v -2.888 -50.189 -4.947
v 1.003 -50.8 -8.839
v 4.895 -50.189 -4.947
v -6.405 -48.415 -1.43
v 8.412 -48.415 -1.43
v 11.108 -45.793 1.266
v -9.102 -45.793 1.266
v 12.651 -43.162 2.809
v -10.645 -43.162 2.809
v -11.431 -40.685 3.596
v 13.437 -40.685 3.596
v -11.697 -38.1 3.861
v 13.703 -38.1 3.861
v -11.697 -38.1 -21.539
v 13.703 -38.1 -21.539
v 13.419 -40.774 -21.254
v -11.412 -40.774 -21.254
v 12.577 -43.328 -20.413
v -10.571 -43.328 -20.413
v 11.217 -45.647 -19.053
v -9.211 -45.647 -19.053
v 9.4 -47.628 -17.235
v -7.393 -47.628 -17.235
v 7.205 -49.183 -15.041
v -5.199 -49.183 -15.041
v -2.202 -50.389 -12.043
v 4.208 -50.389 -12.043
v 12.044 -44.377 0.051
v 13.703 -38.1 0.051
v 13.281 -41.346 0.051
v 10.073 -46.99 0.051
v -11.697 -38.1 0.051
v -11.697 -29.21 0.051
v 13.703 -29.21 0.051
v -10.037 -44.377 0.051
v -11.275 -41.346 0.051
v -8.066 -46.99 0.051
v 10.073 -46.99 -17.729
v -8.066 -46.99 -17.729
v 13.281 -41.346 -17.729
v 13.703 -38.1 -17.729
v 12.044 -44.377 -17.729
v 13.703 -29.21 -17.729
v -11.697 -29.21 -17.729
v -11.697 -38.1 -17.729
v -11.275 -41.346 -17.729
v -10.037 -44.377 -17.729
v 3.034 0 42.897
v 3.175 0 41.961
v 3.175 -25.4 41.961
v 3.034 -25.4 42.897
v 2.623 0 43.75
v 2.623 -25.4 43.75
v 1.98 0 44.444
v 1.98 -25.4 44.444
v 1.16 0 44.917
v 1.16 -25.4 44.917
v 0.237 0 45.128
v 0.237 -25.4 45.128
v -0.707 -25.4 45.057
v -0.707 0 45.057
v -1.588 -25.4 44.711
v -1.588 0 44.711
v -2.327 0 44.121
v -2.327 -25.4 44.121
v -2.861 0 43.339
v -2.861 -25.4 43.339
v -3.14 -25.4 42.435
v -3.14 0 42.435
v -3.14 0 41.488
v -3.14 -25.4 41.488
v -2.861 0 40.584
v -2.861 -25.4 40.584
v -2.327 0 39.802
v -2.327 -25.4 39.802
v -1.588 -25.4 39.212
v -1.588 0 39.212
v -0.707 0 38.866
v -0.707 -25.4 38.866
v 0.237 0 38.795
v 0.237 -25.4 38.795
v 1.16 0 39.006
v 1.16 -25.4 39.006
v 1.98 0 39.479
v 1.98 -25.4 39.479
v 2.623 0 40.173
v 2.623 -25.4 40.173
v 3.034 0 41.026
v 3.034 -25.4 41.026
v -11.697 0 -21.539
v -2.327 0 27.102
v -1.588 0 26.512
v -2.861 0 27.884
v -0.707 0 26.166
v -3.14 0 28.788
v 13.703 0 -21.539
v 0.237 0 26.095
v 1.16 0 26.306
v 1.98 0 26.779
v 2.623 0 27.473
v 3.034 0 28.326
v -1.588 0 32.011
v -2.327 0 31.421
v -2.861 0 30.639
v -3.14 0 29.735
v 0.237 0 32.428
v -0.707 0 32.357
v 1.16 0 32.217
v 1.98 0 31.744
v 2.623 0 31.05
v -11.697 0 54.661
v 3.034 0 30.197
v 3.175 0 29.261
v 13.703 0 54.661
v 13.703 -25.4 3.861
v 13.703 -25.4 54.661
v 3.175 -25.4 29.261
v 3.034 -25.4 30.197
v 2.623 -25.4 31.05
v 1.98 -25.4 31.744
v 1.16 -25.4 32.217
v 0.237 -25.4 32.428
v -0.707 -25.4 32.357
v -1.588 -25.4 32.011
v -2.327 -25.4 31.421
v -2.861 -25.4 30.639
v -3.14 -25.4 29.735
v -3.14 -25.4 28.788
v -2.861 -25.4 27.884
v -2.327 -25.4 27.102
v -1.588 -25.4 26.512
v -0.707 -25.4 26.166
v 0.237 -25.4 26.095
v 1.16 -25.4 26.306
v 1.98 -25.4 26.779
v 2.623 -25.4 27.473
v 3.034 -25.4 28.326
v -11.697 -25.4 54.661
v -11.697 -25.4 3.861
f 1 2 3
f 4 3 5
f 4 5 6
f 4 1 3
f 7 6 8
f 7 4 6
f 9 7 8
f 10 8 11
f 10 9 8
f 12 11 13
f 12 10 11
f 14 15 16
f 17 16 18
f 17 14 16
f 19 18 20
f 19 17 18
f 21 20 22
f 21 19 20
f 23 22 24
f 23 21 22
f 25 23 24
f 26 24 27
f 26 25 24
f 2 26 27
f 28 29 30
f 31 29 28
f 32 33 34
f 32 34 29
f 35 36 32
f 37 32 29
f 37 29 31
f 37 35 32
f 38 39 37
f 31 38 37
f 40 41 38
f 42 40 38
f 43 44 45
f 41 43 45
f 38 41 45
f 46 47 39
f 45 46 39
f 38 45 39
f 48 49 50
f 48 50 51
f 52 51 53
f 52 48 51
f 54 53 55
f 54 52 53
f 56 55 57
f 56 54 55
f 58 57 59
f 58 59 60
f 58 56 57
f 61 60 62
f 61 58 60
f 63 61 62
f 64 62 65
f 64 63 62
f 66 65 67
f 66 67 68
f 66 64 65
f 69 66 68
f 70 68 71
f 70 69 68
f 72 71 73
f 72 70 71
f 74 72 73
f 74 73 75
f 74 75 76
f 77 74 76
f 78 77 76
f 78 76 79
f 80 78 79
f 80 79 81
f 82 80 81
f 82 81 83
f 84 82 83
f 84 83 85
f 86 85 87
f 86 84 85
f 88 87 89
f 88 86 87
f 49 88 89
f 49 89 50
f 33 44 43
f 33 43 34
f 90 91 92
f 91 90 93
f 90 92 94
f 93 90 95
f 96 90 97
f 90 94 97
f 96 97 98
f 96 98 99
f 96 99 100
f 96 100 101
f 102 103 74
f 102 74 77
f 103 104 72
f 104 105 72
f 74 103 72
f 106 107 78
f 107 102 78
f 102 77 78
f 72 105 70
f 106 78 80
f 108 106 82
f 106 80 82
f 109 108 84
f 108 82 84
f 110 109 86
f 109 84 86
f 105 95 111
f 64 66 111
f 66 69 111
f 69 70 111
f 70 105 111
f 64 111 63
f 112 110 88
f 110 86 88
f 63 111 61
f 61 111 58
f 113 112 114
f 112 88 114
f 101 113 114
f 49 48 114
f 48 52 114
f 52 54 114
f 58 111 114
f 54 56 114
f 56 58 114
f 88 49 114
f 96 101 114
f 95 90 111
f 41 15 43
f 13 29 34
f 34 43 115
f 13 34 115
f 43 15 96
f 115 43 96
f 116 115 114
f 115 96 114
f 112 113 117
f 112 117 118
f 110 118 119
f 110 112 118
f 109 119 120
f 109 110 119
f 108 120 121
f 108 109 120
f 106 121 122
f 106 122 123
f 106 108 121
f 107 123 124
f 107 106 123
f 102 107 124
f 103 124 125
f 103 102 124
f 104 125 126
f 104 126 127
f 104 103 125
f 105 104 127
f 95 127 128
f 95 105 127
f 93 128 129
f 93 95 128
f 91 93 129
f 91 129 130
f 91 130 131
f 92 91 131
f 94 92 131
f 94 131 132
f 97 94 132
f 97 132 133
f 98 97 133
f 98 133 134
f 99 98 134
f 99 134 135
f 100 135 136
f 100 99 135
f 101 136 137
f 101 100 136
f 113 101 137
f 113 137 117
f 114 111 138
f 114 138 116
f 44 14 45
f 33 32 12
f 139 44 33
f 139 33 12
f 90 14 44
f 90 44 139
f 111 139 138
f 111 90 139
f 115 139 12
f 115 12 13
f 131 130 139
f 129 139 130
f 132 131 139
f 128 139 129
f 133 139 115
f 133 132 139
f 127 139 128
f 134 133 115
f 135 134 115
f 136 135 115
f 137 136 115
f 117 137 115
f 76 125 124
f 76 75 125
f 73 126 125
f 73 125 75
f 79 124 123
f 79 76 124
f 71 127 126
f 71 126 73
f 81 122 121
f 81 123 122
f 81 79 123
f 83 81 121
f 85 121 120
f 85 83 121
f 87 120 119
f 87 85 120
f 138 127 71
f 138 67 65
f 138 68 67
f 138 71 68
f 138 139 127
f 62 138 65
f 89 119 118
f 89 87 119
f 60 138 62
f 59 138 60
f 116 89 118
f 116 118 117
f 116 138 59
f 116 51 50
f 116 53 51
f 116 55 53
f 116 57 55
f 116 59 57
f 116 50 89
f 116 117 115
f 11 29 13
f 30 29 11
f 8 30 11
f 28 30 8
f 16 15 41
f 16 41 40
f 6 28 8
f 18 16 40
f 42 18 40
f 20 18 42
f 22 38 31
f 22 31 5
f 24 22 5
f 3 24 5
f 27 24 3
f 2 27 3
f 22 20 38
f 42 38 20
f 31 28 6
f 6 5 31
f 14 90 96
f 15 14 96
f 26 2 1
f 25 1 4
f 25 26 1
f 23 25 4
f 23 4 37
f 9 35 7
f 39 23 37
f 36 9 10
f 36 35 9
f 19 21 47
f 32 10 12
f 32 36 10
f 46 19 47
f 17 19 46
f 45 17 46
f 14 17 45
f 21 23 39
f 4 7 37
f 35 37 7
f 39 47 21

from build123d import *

# Parameters (mm, degrees)
F0_W        = 25.4
F0_H        = 76.2
F0_R        = 3.175
F1_DEPTH    = 25.4
F2_W        = 25.4
F2_H        = 25.4
F3_DEPTH    = 25.4
F4_W        = 17.78
F4_H        = 17.78
F5_DEPTH    = 63.5
F6_T1_DEPTH = 88.9
F6_T3_DEPTH = 88.9


# Not quite as in the source:
# - a fillet or chamfer that OpenCascade refuses, or shapes differently, is made with other operations: its cross-section is extruded or revolved along the edge and cut away or added


with BuildPart() as f1:
    # F0 (on Front) → F1 (new body)
    with BuildSketch(Plane.XZ):
        with Locations((1.0031497249, 16.5614479933)):
            Rectangle(F0_W, F0_H)
        with Locations((0, 29.2614479933)):
            Circle(F0_R, mode=Mode.SUBTRACT)
        with Locations((0, 41.9614479933)):
            Circle(F0_R, mode=Mode.SUBTRACT)
    extrude(amount=F1_DEPTH)

    # F2 (on face) → F3 (join)
    with BuildSketch(Plane.XZ.offset(25.4)):
        with Locations((1.0031497249, -8.8385520067)):
            Rectangle(F2_W, F2_H)
    extrude(amount=F3_DEPTH)

    # F4 (on face) → F5 (cut, symmetric)
    with BuildSketch(Plane(origin=(-11.6968502751, 0, 0), x_dir=(0, -1, 0), z_dir=(-1, 0, 0))):
        with Locations((38.1, -8.8385520067)):
            Rectangle(F4_W, F4_H)
    extrude(amount=F5_DEPTH, both=True, mode=Mode.SUBTRACT)

    # F6: fillet of radius 12.7 on 4 edges, made by hand

    # F6_s2 → F6_t1 (cut)
    with BuildSketch(Plane.YZ.offset(-43.4468502751)):
        with BuildLine():
            ThreePointArc((-50.8, -8.8385520067), (-47.0802561211, 0.1417041144), (-38.1, 3.8614479933))
            Line((-38.1, 3.8614479933), (-50.8, 3.8614479933))
            Line((-50.8, 3.8614479933), (-50.8, -8.8385520067))
        make_face()
        with BuildLine():
            ThreePointArc((-38.1, -21.5385520067), (-47.0802561211, -17.8188081278), (-50.8, -8.8385520067))
            Line((-50.8, -8.8385520067), (-50.8, -21.5385520067))
            Line((-50.8, -21.5385520067), (-38.1, -21.5385520067))
        make_face()
    extrude(amount=F6_T1_DEPTH, mode=Mode.SUBTRACT)

    # F6_s4 → F6_t3 (cut)
    with BuildSketch(Plane.XY.offset(-53.2885520067)):
        with BuildLine():
            ThreePointArc((1.0031497249, -50.8), (-7.9771063962, -47.0802561211), (-11.6968502751, -38.1))
            Line((-11.6968502751, -38.1), (-11.6968502751, -50.8))
            Line((-11.6968502751, -50.8), (1.0031497249, -50.8))
        make_face()
        with BuildLine():
            ThreePointArc((13.7031497249, -38.1), (9.983405846, -47.0802561211), (1.0031497249, -50.8))
            Line((1.0031497249, -50.8), (13.7031497249, -50.8))
            Line((13.7031497249, -50.8), (13.7031497249, -38.1))
        make_face()
    extrude(amount=F6_T3_DEPTH, mode=Mode.SUBTRACT)


solid = f1.part
